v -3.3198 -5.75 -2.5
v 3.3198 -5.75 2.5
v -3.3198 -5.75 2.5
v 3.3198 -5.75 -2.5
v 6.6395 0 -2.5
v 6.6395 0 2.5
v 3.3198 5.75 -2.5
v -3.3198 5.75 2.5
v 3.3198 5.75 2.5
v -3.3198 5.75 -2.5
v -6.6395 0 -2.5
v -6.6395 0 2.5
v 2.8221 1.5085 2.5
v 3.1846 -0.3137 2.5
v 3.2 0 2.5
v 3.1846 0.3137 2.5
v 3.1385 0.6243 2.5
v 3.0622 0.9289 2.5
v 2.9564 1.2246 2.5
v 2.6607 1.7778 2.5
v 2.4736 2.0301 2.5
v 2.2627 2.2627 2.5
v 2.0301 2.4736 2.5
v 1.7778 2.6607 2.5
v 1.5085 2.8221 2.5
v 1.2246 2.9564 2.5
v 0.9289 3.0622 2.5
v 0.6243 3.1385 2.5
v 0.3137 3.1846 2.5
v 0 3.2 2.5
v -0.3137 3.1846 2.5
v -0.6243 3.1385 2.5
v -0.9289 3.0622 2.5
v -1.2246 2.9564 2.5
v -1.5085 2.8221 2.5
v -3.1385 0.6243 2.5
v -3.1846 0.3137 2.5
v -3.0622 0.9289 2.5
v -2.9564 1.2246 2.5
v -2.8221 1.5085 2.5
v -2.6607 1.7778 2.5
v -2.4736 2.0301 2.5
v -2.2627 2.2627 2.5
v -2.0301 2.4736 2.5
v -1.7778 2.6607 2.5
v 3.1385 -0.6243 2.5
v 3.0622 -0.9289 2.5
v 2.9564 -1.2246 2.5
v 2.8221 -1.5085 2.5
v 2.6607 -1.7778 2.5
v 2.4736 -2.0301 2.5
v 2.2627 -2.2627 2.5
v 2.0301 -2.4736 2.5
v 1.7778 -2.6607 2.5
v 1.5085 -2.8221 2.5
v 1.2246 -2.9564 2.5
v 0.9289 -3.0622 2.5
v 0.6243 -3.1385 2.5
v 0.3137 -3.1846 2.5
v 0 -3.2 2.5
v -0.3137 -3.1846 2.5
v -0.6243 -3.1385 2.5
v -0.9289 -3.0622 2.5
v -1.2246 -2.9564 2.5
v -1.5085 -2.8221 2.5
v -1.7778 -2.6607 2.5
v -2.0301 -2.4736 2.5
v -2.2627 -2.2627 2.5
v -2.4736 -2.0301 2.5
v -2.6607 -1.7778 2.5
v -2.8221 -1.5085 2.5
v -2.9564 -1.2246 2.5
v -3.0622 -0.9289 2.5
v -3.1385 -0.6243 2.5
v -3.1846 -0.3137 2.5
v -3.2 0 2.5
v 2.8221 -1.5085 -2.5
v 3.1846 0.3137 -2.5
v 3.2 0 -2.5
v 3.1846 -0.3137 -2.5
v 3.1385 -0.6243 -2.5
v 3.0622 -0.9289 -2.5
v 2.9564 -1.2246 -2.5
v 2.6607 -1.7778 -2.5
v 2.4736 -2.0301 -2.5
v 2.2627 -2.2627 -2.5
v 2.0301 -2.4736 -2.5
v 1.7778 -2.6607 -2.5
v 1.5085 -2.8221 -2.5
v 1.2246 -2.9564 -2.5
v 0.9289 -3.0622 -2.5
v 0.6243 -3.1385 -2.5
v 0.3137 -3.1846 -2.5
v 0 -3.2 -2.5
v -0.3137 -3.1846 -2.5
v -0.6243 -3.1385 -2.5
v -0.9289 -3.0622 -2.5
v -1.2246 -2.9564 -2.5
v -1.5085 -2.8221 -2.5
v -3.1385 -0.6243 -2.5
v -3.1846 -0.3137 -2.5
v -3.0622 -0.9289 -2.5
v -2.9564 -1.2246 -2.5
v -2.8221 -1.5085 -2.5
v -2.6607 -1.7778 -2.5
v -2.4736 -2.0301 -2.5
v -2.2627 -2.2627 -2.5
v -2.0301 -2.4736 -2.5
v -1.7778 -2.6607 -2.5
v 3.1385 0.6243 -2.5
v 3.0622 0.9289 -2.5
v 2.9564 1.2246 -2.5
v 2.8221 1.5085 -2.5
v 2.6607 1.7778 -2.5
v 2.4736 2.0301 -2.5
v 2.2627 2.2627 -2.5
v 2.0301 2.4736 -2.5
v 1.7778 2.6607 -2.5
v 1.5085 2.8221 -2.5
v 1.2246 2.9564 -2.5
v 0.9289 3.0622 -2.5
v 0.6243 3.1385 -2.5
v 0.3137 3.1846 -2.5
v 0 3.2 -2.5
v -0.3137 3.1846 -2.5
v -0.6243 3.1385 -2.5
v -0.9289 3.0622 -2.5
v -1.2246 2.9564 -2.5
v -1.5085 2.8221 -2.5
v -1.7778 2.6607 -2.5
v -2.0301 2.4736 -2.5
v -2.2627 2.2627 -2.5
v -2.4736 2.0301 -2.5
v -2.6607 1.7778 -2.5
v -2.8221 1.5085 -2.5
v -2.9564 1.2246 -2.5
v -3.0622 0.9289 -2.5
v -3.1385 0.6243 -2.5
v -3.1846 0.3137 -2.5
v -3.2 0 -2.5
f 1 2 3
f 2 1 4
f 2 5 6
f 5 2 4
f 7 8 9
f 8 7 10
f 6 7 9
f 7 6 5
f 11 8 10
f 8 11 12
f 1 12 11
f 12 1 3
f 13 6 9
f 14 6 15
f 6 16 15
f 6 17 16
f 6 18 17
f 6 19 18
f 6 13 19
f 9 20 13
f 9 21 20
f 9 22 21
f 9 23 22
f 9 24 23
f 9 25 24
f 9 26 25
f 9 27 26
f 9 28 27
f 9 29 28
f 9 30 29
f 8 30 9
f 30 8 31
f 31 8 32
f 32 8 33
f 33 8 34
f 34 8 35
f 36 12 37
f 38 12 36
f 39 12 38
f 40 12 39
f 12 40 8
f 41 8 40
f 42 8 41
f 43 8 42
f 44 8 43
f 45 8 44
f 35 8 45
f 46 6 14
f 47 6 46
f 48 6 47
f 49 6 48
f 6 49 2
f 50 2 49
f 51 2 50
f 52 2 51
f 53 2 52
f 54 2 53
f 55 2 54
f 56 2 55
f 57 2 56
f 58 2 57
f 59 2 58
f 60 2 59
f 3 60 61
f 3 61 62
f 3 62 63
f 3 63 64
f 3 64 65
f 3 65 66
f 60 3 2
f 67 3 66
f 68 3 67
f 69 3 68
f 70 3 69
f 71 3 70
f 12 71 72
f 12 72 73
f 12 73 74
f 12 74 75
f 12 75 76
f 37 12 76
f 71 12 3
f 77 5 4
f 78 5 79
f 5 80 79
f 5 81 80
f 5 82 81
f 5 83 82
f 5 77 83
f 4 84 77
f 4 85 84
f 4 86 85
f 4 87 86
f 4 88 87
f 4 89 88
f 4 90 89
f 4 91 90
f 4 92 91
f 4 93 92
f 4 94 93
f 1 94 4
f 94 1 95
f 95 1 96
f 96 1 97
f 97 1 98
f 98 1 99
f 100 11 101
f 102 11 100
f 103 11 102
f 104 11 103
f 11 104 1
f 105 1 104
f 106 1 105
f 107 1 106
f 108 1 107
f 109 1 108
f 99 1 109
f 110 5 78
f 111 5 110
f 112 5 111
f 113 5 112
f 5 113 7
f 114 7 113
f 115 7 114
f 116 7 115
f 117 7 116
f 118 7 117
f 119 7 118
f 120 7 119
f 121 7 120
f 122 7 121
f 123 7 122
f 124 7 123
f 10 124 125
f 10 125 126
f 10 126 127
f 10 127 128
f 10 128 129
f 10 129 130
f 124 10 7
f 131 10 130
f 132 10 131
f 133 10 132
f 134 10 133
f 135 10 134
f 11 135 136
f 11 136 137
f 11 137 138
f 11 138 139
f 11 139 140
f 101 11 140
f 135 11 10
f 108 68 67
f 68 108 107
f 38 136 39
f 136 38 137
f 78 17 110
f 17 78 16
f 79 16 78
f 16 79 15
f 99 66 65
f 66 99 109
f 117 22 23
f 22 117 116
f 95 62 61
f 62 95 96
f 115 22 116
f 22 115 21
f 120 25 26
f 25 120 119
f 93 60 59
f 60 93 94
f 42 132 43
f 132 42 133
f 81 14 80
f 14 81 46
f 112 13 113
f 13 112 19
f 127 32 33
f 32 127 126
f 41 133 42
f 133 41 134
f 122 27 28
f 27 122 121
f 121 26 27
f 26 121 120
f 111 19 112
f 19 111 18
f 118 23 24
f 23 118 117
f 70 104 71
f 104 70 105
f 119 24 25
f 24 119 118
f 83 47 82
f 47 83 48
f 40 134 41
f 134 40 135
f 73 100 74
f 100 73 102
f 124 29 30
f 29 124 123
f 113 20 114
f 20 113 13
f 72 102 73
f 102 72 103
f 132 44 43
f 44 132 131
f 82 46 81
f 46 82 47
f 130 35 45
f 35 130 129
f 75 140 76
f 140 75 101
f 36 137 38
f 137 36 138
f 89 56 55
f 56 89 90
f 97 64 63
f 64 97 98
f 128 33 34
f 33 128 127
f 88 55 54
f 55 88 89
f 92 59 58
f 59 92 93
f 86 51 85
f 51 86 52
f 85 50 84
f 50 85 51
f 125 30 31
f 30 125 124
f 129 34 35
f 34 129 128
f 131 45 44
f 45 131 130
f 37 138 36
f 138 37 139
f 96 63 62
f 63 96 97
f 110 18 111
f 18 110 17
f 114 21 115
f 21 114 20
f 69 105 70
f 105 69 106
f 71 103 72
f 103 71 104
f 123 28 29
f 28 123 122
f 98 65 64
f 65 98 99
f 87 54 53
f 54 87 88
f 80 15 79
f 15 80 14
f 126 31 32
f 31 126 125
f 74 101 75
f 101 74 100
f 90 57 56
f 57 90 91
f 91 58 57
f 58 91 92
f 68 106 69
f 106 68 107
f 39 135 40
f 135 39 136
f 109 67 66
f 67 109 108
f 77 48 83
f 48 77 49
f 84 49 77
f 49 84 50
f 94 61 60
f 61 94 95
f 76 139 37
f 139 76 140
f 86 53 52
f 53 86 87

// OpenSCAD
$fn=64;

nut_thickness = 5.0;
across_flats = 11.5;
hole_diameter = 6.0;
clearance = 0.4;

module hex_prism(af, h){
    r = af / sqrt(3);
    cylinder(h=h, r=r, center=true, $fn=6);
}

module nut(af, h, hole_d){
    difference(){
        hex_prism(af, h);
        cylinder(h=h+0.4, d=hole_d, center=true, $fn=64);
    }
}

nut(across_flats, nut_thickness, hole_diameter + clearance);
